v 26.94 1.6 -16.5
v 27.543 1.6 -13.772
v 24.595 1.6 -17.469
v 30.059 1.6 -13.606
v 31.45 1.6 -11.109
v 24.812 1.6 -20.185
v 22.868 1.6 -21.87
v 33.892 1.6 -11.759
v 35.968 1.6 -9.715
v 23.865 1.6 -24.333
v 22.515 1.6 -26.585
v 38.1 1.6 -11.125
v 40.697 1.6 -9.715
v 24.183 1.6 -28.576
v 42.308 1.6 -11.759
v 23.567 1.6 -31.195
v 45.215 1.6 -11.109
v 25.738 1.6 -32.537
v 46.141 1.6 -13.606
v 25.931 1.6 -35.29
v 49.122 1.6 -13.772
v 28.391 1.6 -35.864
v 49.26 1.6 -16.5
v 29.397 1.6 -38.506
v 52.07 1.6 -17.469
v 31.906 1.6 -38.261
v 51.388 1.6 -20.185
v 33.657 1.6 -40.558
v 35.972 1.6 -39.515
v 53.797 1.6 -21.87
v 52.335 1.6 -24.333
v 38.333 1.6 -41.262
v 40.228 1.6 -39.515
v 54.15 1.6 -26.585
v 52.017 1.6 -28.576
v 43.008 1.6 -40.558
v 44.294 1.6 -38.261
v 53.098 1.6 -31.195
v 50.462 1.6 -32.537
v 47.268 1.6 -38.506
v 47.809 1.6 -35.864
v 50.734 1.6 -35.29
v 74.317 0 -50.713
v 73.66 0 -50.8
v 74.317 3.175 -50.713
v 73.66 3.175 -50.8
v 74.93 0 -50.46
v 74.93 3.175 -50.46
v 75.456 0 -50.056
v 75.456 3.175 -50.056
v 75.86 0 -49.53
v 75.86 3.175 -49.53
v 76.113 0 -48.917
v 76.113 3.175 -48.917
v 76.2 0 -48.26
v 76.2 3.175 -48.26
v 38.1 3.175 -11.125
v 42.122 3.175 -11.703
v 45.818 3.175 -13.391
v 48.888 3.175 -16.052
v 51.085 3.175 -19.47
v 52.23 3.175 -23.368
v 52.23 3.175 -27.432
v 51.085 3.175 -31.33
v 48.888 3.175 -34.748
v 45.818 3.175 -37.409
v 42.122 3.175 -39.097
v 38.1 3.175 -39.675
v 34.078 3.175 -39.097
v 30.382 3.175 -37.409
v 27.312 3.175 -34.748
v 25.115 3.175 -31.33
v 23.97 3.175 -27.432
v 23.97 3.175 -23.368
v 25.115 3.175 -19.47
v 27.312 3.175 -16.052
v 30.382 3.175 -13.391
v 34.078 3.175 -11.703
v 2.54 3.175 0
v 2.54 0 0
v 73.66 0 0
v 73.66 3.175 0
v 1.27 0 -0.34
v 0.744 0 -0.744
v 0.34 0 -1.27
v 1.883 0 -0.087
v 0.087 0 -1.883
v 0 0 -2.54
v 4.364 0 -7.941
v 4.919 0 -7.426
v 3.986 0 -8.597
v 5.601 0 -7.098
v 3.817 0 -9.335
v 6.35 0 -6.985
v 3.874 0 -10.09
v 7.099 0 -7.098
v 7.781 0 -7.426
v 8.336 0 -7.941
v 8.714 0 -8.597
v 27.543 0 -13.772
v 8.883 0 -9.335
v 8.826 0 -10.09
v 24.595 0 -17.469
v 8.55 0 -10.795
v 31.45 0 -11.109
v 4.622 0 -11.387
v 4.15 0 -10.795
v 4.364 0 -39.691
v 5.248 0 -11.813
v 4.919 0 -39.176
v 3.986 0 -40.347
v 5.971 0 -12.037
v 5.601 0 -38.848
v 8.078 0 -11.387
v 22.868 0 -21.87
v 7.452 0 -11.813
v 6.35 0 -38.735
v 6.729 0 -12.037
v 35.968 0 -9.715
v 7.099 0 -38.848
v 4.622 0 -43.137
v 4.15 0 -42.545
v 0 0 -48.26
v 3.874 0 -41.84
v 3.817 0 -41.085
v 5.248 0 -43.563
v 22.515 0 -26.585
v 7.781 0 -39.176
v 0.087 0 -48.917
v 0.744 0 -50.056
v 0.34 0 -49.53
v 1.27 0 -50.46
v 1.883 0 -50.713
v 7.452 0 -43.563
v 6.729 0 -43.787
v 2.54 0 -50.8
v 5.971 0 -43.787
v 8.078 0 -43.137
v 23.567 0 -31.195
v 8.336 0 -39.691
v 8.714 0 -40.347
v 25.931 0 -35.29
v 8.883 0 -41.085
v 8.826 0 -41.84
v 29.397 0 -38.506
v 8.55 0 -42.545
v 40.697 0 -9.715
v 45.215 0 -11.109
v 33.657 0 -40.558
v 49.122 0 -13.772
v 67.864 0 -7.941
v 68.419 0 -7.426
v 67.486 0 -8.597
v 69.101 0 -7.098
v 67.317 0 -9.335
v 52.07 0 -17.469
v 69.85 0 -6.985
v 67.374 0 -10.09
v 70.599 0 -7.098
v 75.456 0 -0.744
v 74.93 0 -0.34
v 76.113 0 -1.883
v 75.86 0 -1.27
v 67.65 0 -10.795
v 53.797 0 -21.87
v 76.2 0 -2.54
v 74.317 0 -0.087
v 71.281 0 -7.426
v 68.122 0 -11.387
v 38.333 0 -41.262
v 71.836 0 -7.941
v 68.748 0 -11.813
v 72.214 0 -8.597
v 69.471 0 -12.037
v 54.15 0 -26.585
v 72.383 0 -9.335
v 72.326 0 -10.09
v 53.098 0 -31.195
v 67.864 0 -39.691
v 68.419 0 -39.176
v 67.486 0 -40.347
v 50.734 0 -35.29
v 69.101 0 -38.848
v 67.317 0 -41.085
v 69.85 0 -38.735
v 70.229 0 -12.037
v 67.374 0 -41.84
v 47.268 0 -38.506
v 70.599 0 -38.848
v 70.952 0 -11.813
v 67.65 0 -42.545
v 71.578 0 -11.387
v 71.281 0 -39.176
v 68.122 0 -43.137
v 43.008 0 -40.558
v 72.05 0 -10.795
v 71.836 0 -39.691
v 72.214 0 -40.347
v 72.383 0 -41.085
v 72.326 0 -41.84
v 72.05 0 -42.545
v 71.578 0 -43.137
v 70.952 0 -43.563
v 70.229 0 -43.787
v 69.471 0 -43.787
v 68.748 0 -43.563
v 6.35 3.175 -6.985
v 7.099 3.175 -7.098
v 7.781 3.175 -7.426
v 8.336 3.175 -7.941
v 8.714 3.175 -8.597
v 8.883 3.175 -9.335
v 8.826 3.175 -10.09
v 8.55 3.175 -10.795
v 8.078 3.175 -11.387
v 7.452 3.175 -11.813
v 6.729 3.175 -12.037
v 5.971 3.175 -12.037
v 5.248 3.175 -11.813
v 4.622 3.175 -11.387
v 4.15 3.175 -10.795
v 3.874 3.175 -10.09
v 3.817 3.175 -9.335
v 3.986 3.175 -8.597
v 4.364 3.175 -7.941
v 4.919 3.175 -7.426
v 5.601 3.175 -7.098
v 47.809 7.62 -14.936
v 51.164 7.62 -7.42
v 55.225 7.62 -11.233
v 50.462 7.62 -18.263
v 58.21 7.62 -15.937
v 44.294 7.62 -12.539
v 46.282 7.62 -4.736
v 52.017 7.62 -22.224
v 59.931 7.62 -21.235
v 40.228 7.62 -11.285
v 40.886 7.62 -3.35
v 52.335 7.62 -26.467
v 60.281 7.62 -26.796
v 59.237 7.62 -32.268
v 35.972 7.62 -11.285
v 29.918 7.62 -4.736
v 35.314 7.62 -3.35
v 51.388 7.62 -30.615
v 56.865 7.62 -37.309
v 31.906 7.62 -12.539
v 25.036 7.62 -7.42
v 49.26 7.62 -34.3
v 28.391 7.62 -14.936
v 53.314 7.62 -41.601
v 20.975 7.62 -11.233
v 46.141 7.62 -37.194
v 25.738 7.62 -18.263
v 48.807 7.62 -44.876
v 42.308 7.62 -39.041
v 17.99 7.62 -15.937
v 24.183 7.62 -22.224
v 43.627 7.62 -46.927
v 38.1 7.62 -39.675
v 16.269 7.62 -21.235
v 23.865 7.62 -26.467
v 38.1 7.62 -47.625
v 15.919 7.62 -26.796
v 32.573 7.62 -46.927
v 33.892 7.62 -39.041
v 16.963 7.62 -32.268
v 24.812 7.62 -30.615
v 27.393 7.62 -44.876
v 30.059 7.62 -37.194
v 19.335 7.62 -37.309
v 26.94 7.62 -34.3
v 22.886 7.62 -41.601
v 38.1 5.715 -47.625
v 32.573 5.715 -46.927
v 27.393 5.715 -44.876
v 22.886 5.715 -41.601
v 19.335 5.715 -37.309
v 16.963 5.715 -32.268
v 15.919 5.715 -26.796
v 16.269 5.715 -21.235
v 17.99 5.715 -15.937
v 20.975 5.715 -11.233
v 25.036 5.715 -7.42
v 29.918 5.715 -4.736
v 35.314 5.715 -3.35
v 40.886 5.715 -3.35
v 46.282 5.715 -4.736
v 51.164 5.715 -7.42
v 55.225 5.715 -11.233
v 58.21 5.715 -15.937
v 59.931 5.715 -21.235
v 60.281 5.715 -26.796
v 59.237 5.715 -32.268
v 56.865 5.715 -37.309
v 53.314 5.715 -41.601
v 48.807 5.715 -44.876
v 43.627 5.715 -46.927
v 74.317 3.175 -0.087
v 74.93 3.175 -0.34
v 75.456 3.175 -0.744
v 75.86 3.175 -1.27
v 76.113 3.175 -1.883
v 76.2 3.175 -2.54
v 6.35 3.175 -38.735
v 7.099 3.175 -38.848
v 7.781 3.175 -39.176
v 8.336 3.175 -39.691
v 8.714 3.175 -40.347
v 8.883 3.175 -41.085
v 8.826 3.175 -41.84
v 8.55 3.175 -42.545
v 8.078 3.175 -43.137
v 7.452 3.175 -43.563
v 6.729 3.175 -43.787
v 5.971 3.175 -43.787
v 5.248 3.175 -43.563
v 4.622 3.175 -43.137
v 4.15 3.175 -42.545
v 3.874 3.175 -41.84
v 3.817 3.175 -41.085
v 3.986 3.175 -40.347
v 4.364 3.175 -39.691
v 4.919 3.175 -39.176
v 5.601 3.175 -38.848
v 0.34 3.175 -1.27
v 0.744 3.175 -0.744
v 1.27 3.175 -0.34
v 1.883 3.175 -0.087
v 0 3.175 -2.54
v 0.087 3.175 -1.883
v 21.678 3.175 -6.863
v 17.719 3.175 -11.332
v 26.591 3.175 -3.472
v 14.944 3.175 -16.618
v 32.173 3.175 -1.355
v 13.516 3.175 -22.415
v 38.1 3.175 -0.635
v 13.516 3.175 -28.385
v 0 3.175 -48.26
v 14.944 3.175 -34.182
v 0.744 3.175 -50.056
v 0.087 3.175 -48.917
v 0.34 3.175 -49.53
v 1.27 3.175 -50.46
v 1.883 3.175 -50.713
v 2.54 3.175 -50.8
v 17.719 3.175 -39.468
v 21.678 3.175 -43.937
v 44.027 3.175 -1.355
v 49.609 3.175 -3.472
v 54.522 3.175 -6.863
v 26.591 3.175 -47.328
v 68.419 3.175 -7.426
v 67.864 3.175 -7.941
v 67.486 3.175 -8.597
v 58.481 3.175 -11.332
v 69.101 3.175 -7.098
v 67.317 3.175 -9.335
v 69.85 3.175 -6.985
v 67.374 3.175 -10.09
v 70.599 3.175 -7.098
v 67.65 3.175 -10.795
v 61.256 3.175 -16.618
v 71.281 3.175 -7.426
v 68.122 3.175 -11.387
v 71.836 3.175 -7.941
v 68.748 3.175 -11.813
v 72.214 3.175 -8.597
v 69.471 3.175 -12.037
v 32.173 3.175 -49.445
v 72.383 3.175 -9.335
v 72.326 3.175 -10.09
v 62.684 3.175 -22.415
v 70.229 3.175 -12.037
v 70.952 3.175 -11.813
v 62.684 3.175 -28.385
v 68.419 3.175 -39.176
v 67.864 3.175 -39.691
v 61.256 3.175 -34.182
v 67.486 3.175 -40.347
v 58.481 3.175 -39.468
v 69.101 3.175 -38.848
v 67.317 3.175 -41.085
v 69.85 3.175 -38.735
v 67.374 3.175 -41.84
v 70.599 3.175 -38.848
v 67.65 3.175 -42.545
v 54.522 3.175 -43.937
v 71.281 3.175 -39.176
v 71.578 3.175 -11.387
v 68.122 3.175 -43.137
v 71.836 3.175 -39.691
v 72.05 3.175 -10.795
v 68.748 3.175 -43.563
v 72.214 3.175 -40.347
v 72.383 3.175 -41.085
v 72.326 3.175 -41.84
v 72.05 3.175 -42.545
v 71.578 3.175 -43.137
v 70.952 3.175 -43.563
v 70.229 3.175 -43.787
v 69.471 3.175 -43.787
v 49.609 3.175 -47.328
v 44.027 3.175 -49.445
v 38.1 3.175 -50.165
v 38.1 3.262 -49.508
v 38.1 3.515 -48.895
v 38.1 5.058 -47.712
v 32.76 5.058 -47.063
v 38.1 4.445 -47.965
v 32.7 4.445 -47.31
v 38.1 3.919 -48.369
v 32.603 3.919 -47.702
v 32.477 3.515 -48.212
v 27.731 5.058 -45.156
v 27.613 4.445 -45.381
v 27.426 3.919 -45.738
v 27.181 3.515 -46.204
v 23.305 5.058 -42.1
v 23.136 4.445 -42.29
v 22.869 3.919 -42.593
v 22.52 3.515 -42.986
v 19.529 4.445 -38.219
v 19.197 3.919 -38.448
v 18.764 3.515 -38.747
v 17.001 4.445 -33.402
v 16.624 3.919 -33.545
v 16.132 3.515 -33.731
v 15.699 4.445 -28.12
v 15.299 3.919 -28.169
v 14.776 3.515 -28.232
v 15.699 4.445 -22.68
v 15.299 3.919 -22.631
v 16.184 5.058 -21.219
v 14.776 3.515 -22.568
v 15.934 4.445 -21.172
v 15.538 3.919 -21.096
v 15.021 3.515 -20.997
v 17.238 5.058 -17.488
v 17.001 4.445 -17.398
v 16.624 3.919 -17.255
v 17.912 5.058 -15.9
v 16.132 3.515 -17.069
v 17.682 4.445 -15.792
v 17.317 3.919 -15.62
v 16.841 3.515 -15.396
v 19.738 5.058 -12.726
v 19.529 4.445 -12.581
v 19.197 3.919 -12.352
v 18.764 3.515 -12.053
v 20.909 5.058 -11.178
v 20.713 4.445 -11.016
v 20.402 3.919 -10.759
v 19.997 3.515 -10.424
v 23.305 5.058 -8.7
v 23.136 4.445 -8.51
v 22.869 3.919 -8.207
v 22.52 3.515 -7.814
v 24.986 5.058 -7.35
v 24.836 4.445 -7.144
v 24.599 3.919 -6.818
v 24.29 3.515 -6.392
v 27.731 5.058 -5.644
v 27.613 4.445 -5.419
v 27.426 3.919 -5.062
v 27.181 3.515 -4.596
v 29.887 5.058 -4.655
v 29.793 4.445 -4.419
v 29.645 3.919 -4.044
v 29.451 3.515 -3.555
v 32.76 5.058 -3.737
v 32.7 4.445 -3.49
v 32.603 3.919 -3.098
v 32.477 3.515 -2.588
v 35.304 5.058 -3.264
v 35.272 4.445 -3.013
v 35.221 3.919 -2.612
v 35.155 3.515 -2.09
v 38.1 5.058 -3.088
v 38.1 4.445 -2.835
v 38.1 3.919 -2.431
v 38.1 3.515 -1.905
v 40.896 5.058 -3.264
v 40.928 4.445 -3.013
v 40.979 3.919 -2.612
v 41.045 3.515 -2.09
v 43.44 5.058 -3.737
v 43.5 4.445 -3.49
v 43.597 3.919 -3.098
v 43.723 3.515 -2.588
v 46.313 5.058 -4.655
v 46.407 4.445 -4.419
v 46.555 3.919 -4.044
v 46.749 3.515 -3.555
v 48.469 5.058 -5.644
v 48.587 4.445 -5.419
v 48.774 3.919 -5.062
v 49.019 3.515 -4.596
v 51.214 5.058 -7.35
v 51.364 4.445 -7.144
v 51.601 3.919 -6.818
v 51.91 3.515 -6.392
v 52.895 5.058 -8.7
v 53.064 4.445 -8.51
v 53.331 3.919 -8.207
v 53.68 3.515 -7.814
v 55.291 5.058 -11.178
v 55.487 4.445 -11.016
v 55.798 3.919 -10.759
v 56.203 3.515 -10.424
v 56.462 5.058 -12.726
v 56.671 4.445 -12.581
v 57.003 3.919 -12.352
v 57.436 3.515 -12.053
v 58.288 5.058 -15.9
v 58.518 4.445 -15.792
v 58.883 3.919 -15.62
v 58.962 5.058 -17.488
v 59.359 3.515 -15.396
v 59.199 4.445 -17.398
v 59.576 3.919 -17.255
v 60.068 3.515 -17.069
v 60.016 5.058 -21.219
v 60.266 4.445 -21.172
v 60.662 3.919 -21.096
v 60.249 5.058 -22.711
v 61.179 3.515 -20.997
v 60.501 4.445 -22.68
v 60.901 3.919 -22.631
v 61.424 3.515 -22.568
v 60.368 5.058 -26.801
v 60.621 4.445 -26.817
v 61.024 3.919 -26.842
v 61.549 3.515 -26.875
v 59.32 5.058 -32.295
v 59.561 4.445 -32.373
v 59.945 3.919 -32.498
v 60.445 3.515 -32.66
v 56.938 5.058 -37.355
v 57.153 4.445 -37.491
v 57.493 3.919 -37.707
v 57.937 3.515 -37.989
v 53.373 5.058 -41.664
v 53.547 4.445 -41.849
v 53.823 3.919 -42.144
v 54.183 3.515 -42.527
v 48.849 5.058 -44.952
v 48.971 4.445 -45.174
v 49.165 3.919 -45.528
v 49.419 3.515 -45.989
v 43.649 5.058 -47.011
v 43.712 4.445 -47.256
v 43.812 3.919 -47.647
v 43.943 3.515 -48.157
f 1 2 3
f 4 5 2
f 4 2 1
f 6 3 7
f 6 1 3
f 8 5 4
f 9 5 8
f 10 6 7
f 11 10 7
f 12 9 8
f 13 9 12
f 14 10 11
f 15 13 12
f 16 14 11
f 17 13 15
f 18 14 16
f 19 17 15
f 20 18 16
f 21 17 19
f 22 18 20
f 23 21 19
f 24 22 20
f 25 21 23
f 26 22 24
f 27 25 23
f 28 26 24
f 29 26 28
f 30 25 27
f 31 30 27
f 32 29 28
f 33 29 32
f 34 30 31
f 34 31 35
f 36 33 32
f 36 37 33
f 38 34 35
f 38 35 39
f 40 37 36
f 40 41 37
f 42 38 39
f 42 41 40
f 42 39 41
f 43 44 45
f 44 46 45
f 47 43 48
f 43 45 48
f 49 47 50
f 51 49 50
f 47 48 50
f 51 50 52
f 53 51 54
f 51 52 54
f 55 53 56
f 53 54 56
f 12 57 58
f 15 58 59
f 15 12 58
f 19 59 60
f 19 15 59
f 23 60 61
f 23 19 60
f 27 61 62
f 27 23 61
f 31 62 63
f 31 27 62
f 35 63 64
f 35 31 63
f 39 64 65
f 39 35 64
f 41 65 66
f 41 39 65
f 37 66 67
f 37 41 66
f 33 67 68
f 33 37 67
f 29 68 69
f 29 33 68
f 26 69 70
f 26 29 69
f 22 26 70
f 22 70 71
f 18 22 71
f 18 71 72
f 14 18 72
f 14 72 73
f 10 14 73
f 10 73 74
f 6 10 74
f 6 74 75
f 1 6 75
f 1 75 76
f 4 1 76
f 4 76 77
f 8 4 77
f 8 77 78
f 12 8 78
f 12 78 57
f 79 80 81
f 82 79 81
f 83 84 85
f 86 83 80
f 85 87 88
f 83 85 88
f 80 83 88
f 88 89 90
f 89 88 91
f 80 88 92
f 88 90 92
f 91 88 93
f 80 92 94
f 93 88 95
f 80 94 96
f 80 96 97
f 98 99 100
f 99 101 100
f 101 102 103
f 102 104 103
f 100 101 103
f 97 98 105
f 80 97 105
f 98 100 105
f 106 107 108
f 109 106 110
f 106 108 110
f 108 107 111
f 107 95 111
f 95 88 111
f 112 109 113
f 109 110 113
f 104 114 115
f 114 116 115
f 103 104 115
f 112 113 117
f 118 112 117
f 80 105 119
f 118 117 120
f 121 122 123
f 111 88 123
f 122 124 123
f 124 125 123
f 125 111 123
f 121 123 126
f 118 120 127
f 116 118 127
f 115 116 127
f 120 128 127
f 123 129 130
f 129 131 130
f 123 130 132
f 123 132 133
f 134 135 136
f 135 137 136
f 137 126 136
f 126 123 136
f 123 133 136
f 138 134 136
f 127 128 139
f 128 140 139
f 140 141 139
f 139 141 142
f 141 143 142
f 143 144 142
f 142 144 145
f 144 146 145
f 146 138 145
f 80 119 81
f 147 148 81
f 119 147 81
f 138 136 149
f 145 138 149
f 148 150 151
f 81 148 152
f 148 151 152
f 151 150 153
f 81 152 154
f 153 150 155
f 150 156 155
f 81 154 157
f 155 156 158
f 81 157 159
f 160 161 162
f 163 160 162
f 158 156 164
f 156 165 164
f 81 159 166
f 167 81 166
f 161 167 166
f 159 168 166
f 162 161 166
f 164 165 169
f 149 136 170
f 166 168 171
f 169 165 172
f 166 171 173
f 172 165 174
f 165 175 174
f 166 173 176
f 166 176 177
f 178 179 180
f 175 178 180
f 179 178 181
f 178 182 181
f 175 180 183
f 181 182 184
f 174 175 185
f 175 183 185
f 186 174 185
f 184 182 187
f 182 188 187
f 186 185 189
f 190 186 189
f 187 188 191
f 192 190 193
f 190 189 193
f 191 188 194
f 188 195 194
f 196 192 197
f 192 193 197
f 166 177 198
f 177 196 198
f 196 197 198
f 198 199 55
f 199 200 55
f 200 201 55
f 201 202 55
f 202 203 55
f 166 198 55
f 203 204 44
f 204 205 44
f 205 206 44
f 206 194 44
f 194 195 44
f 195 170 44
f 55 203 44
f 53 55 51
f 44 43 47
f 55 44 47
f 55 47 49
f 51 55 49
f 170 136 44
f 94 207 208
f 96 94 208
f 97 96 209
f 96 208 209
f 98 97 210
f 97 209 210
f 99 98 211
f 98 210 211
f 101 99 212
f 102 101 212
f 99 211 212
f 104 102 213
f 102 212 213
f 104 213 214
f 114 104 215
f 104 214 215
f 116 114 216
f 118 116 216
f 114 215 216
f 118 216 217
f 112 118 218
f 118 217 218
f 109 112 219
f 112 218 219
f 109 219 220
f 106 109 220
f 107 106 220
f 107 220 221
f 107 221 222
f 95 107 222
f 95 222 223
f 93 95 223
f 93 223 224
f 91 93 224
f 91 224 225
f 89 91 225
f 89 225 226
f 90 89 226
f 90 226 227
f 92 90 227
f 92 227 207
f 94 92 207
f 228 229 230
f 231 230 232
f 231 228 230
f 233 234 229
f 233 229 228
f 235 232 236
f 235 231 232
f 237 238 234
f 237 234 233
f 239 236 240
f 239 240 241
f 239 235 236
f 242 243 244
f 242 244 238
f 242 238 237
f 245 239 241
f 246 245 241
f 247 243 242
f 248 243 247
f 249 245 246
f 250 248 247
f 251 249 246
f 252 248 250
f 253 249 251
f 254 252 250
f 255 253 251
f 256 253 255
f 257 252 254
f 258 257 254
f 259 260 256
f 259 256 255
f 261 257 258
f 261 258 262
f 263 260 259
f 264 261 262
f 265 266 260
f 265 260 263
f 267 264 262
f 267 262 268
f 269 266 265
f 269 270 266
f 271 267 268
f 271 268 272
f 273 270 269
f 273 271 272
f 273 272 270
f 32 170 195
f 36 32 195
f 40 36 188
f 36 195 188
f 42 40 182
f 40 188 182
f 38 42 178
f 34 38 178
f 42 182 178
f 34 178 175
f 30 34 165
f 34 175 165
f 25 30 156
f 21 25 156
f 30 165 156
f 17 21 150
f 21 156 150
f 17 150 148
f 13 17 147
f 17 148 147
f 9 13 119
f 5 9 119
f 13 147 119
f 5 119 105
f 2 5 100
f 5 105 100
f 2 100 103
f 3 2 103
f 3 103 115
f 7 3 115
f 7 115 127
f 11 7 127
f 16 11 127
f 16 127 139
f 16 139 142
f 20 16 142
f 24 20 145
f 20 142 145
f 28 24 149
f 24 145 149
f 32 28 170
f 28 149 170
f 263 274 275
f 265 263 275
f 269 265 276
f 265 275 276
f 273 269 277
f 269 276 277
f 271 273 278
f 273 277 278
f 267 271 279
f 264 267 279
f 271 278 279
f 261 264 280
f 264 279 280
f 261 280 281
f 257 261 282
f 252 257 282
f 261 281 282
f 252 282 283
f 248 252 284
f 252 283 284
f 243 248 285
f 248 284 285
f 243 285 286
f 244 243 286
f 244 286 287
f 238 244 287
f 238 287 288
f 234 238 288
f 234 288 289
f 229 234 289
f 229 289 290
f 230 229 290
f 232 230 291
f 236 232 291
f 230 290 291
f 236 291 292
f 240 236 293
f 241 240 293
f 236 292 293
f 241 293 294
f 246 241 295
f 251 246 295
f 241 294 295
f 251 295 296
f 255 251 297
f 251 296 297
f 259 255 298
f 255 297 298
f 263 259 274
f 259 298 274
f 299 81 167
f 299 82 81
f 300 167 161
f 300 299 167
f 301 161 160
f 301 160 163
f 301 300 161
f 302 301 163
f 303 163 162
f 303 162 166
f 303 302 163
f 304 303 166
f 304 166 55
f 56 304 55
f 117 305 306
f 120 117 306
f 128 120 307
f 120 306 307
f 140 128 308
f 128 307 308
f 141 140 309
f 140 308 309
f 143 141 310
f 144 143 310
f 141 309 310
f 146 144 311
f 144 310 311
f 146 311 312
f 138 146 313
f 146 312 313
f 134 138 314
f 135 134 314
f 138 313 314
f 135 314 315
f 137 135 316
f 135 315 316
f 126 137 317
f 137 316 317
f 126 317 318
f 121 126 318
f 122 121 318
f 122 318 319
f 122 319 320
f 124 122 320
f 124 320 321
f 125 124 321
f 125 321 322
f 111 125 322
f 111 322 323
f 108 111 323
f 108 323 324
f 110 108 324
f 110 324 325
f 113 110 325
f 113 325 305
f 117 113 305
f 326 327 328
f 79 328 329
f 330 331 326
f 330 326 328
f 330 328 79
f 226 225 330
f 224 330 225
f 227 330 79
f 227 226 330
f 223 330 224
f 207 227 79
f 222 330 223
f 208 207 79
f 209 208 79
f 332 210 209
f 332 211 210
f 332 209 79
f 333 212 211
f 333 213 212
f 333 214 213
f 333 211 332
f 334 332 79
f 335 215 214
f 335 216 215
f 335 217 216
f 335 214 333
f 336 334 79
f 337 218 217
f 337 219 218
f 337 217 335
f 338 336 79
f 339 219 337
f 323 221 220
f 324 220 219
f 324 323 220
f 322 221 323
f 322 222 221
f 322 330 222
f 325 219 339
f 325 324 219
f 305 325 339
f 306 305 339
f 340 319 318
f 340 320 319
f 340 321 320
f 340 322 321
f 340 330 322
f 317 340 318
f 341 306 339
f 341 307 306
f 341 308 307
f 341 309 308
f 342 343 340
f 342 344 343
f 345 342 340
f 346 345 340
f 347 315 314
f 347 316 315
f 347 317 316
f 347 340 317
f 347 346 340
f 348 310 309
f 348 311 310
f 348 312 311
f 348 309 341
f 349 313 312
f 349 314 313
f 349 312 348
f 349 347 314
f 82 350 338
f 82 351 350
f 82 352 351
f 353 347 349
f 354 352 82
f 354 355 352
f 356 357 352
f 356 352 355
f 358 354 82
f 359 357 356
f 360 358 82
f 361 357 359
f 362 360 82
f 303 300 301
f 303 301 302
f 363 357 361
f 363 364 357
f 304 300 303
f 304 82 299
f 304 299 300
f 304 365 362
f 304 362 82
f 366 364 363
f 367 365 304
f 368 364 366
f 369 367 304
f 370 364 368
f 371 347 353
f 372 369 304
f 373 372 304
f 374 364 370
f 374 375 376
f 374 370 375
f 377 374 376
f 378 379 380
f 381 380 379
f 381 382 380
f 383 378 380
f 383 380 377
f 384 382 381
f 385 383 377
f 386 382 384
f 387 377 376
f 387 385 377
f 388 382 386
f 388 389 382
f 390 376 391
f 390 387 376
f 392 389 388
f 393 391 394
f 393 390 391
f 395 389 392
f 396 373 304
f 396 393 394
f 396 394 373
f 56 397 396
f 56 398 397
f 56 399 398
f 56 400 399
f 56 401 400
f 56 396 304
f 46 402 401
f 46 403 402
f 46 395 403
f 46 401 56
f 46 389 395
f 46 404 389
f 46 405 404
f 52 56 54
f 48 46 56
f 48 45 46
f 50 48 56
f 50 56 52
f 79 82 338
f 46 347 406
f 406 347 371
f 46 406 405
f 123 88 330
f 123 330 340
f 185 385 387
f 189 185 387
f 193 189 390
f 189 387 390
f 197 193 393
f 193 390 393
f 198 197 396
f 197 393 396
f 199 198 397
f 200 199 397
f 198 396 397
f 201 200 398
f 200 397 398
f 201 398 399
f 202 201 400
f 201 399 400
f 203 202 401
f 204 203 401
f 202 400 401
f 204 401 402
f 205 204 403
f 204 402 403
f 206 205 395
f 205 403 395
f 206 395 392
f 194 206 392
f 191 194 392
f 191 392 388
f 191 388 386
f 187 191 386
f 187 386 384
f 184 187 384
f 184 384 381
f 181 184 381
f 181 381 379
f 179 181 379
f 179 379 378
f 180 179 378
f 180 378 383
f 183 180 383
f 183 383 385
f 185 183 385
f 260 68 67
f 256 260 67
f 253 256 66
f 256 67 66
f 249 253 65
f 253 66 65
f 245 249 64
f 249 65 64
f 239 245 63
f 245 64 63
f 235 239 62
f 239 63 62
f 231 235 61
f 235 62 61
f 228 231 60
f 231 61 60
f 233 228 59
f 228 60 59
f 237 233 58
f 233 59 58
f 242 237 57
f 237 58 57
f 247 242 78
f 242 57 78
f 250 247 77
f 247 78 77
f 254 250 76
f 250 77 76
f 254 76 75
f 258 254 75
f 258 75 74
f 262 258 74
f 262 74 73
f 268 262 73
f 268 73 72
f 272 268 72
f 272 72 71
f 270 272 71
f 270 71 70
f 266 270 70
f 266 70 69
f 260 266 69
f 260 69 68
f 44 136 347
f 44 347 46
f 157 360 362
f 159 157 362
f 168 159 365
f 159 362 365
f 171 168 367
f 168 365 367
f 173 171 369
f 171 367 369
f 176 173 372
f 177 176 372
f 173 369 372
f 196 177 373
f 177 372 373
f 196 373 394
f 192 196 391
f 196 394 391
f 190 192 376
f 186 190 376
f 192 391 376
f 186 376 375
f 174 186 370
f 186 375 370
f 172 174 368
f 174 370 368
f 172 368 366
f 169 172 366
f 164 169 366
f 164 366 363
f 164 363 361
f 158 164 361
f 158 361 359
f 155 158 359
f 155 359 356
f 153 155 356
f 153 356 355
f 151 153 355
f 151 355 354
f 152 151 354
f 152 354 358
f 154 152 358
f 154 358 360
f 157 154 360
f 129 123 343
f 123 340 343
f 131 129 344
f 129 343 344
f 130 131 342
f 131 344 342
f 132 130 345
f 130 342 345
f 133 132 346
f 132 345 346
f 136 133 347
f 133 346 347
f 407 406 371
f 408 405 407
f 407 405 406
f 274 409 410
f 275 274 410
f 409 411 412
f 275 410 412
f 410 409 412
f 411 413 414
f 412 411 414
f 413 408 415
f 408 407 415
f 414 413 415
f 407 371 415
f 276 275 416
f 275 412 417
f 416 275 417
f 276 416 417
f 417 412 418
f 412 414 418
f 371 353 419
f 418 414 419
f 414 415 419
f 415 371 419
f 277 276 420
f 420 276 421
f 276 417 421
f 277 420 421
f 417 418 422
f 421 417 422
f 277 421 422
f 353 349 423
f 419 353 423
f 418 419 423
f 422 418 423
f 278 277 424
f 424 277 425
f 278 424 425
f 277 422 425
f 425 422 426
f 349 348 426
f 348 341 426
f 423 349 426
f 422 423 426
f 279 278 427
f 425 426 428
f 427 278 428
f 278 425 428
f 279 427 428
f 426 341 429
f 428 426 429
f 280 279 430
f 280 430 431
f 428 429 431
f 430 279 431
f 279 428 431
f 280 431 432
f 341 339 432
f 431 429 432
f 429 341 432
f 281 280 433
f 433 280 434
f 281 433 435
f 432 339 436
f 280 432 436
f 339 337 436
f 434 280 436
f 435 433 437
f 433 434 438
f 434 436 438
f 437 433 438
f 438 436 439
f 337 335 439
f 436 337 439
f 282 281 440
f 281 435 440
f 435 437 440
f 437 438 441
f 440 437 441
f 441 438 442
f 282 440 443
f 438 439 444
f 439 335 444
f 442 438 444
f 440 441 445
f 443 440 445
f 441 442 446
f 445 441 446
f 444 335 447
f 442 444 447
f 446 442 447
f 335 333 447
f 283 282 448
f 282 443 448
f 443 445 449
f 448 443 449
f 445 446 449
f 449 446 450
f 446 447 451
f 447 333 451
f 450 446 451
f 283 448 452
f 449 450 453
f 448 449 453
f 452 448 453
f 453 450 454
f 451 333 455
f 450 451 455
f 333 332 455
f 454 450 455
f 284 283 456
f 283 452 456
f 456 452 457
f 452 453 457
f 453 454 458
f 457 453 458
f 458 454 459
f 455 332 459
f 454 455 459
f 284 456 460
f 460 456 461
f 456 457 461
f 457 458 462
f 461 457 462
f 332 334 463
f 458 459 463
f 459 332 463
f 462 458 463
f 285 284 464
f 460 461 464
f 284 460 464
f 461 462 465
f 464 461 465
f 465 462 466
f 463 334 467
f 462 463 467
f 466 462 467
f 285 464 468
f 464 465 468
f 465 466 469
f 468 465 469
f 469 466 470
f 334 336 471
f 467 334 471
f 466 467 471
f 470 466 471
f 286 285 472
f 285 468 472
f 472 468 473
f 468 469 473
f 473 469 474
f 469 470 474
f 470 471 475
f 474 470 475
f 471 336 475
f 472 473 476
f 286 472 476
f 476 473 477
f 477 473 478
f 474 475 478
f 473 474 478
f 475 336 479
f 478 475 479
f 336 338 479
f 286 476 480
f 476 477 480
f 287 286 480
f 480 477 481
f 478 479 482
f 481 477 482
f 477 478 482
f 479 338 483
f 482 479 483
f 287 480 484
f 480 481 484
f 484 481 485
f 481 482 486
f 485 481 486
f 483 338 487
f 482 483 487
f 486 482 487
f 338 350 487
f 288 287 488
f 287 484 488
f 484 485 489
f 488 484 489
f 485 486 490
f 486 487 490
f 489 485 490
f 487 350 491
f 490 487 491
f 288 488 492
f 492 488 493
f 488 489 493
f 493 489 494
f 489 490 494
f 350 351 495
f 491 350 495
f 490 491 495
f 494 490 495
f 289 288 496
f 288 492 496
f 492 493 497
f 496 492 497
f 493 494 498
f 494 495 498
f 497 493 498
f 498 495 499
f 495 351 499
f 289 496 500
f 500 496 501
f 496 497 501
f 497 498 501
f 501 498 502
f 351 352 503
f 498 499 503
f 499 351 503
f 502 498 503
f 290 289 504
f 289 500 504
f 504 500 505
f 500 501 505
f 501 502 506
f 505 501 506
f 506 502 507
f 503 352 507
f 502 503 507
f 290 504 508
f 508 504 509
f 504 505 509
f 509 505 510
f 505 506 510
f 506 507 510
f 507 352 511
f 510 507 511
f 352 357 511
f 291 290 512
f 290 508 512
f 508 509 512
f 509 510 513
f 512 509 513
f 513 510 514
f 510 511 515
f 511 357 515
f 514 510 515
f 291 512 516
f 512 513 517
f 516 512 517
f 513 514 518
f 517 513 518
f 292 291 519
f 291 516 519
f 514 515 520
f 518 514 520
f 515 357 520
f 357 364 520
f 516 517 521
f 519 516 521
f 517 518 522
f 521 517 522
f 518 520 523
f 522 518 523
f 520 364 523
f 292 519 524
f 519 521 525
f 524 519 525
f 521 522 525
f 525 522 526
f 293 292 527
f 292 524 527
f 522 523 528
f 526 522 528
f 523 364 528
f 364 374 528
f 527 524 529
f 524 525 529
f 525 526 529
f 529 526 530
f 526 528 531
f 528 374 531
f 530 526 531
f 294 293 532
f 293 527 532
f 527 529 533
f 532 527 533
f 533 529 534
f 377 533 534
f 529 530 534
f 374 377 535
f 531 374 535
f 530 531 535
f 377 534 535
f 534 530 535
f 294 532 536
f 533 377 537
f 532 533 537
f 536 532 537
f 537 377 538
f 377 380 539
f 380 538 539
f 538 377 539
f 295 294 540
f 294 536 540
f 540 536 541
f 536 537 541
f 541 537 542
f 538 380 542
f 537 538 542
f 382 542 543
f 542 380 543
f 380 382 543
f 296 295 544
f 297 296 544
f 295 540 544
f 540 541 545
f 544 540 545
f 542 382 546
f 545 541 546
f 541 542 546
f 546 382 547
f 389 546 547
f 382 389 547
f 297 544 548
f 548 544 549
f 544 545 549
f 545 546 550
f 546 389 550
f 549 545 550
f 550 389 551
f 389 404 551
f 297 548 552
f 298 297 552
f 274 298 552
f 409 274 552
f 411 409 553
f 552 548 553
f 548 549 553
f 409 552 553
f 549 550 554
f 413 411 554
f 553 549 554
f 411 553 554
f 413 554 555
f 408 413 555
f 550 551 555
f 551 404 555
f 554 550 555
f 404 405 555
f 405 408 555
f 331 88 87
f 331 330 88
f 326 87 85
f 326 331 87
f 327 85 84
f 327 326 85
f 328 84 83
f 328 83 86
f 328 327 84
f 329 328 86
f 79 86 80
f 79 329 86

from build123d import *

# Parameters (mm, degrees)
SKETCH1_W           = 76.2
SKETCH1_H           = 50.8
SKETCH1_R           = 14.2748
BOSS_EXTRUDE1_DEPTH = 3.175
SKETCH2_R           = 22.225
BOSS_EXTRUDE2_DEPTH = 4.445
SKETCH3_R           = 14.2748
CUT_EXTRUDE1_DEPTH  = 92.688810795
SKETCH4_R           = 15.8623
CUT_EXTRUDE2_DEPTH  = 1.6002
FILLET1_R           = 2.54
FILLET2_R           = 2.54
SKETCH5_R           = 2.54
CUT_EXTRUDE3_DEPTH  = 92.688810795


with BuildPart() as part:
    # Sketch1 → Boss-Extrude1 (new body)
    with BuildSketch(Plane(origin=(0, 0, 0), x_dir=(1, 0, 0), z_dir=(0, 1, 0))):
        with Locations((38.1, 25.4)):
            Rectangle(SKETCH1_W, SKETCH1_H)
        with Locations(Location((38.1, 25.4, 0), (0, 0, 270))):
            Circle(SKETCH1_R, mode=Mode.SUBTRACT)
    extrude(amount=BOSS_EXTRUDE1_DEPTH)

    # Sketch2 → Boss-Extrude2 (add)
    with BuildSketch(Plane(origin=(0, 3.175, 0), x_dir=(1, 0, 0), z_dir=(0, 1, 0))):
        with Locations(Location((38.1, 25.4, 0), (0, 0, 90))):
            Circle(SKETCH2_R)
    extrude(amount=BOSS_EXTRUDE2_DEPTH)

    # Sketch3 → Cut-Extrude1 (cut, through all)
    with BuildSketch(Plane.XZ.offset(-3.175)):
        with Locations(Location((38.1, -25.4, 0), (0, 0, 270))):
            Circle(SKETCH3_R)
    extrude(amount=-CUT_EXTRUDE1_DEPTH, mode=Mode.SUBTRACT)

    # Sketch4 → Cut-Extrude2 (cut)
    with BuildSketch(Plane(origin=(0, 0, 0), x_dir=(-1, 0, 0), z_dir=(0, -1, 0))):
        with Locations(Location((-38.332507849, 25.4, 0), (0, 0, 90))):
            Circle(SKETCH4_R)
    extrude(amount=-CUT_EXTRUDE2_DEPTH, mode=Mode.SUBTRACT)

    # Fillet1
    fillet1_edges = [part.edges().sort_by_distance(p)[0] for p in [
        (38.1, 3.175, -3.175),
    ]]
    fillet(fillet1_edges, radius=FILLET1_R)

    # Fillet2
    fillet2_edges = [part.edges().sort_by_distance(p)[0] for p in [
        (0, 1.5875, -50.8),
        (76.2, 1.5875, -50.8),
        (76.2, 1.5875, 0),
        (0, 1.5875, 0),
    ]]
    fillet(fillet2_edges, radius=FILLET2_R)

    # Sketch5 → Cut-Extrude3 (cut, through all)
    with BuildSketch(Plane(origin=(0, 3.175, 0), x_dir=(1, 0, 0), z_dir=(0, 1, 0))):
        with Locations(Location((69.85, 41.275, 0), (0, 0, 270))):
            Circle(SKETCH5_R)
        with Locations(Location((69.85, 9.525, 0), (0, 0, 270))):
            Circle(SKETCH5_R)
        with Locations(Location((6.35, 9.525, 0), (0, 0, 270))):
            Circle(SKETCH5_R)
        with Locations(Location((6.35, 41.275, 0), (0, 0, 270))):
            Circle(SKETCH5_R)
    extrude(amount=-CUT_EXTRUDE3_DEPTH, mode=Mode.SUBTRACT)


solid = part.part
